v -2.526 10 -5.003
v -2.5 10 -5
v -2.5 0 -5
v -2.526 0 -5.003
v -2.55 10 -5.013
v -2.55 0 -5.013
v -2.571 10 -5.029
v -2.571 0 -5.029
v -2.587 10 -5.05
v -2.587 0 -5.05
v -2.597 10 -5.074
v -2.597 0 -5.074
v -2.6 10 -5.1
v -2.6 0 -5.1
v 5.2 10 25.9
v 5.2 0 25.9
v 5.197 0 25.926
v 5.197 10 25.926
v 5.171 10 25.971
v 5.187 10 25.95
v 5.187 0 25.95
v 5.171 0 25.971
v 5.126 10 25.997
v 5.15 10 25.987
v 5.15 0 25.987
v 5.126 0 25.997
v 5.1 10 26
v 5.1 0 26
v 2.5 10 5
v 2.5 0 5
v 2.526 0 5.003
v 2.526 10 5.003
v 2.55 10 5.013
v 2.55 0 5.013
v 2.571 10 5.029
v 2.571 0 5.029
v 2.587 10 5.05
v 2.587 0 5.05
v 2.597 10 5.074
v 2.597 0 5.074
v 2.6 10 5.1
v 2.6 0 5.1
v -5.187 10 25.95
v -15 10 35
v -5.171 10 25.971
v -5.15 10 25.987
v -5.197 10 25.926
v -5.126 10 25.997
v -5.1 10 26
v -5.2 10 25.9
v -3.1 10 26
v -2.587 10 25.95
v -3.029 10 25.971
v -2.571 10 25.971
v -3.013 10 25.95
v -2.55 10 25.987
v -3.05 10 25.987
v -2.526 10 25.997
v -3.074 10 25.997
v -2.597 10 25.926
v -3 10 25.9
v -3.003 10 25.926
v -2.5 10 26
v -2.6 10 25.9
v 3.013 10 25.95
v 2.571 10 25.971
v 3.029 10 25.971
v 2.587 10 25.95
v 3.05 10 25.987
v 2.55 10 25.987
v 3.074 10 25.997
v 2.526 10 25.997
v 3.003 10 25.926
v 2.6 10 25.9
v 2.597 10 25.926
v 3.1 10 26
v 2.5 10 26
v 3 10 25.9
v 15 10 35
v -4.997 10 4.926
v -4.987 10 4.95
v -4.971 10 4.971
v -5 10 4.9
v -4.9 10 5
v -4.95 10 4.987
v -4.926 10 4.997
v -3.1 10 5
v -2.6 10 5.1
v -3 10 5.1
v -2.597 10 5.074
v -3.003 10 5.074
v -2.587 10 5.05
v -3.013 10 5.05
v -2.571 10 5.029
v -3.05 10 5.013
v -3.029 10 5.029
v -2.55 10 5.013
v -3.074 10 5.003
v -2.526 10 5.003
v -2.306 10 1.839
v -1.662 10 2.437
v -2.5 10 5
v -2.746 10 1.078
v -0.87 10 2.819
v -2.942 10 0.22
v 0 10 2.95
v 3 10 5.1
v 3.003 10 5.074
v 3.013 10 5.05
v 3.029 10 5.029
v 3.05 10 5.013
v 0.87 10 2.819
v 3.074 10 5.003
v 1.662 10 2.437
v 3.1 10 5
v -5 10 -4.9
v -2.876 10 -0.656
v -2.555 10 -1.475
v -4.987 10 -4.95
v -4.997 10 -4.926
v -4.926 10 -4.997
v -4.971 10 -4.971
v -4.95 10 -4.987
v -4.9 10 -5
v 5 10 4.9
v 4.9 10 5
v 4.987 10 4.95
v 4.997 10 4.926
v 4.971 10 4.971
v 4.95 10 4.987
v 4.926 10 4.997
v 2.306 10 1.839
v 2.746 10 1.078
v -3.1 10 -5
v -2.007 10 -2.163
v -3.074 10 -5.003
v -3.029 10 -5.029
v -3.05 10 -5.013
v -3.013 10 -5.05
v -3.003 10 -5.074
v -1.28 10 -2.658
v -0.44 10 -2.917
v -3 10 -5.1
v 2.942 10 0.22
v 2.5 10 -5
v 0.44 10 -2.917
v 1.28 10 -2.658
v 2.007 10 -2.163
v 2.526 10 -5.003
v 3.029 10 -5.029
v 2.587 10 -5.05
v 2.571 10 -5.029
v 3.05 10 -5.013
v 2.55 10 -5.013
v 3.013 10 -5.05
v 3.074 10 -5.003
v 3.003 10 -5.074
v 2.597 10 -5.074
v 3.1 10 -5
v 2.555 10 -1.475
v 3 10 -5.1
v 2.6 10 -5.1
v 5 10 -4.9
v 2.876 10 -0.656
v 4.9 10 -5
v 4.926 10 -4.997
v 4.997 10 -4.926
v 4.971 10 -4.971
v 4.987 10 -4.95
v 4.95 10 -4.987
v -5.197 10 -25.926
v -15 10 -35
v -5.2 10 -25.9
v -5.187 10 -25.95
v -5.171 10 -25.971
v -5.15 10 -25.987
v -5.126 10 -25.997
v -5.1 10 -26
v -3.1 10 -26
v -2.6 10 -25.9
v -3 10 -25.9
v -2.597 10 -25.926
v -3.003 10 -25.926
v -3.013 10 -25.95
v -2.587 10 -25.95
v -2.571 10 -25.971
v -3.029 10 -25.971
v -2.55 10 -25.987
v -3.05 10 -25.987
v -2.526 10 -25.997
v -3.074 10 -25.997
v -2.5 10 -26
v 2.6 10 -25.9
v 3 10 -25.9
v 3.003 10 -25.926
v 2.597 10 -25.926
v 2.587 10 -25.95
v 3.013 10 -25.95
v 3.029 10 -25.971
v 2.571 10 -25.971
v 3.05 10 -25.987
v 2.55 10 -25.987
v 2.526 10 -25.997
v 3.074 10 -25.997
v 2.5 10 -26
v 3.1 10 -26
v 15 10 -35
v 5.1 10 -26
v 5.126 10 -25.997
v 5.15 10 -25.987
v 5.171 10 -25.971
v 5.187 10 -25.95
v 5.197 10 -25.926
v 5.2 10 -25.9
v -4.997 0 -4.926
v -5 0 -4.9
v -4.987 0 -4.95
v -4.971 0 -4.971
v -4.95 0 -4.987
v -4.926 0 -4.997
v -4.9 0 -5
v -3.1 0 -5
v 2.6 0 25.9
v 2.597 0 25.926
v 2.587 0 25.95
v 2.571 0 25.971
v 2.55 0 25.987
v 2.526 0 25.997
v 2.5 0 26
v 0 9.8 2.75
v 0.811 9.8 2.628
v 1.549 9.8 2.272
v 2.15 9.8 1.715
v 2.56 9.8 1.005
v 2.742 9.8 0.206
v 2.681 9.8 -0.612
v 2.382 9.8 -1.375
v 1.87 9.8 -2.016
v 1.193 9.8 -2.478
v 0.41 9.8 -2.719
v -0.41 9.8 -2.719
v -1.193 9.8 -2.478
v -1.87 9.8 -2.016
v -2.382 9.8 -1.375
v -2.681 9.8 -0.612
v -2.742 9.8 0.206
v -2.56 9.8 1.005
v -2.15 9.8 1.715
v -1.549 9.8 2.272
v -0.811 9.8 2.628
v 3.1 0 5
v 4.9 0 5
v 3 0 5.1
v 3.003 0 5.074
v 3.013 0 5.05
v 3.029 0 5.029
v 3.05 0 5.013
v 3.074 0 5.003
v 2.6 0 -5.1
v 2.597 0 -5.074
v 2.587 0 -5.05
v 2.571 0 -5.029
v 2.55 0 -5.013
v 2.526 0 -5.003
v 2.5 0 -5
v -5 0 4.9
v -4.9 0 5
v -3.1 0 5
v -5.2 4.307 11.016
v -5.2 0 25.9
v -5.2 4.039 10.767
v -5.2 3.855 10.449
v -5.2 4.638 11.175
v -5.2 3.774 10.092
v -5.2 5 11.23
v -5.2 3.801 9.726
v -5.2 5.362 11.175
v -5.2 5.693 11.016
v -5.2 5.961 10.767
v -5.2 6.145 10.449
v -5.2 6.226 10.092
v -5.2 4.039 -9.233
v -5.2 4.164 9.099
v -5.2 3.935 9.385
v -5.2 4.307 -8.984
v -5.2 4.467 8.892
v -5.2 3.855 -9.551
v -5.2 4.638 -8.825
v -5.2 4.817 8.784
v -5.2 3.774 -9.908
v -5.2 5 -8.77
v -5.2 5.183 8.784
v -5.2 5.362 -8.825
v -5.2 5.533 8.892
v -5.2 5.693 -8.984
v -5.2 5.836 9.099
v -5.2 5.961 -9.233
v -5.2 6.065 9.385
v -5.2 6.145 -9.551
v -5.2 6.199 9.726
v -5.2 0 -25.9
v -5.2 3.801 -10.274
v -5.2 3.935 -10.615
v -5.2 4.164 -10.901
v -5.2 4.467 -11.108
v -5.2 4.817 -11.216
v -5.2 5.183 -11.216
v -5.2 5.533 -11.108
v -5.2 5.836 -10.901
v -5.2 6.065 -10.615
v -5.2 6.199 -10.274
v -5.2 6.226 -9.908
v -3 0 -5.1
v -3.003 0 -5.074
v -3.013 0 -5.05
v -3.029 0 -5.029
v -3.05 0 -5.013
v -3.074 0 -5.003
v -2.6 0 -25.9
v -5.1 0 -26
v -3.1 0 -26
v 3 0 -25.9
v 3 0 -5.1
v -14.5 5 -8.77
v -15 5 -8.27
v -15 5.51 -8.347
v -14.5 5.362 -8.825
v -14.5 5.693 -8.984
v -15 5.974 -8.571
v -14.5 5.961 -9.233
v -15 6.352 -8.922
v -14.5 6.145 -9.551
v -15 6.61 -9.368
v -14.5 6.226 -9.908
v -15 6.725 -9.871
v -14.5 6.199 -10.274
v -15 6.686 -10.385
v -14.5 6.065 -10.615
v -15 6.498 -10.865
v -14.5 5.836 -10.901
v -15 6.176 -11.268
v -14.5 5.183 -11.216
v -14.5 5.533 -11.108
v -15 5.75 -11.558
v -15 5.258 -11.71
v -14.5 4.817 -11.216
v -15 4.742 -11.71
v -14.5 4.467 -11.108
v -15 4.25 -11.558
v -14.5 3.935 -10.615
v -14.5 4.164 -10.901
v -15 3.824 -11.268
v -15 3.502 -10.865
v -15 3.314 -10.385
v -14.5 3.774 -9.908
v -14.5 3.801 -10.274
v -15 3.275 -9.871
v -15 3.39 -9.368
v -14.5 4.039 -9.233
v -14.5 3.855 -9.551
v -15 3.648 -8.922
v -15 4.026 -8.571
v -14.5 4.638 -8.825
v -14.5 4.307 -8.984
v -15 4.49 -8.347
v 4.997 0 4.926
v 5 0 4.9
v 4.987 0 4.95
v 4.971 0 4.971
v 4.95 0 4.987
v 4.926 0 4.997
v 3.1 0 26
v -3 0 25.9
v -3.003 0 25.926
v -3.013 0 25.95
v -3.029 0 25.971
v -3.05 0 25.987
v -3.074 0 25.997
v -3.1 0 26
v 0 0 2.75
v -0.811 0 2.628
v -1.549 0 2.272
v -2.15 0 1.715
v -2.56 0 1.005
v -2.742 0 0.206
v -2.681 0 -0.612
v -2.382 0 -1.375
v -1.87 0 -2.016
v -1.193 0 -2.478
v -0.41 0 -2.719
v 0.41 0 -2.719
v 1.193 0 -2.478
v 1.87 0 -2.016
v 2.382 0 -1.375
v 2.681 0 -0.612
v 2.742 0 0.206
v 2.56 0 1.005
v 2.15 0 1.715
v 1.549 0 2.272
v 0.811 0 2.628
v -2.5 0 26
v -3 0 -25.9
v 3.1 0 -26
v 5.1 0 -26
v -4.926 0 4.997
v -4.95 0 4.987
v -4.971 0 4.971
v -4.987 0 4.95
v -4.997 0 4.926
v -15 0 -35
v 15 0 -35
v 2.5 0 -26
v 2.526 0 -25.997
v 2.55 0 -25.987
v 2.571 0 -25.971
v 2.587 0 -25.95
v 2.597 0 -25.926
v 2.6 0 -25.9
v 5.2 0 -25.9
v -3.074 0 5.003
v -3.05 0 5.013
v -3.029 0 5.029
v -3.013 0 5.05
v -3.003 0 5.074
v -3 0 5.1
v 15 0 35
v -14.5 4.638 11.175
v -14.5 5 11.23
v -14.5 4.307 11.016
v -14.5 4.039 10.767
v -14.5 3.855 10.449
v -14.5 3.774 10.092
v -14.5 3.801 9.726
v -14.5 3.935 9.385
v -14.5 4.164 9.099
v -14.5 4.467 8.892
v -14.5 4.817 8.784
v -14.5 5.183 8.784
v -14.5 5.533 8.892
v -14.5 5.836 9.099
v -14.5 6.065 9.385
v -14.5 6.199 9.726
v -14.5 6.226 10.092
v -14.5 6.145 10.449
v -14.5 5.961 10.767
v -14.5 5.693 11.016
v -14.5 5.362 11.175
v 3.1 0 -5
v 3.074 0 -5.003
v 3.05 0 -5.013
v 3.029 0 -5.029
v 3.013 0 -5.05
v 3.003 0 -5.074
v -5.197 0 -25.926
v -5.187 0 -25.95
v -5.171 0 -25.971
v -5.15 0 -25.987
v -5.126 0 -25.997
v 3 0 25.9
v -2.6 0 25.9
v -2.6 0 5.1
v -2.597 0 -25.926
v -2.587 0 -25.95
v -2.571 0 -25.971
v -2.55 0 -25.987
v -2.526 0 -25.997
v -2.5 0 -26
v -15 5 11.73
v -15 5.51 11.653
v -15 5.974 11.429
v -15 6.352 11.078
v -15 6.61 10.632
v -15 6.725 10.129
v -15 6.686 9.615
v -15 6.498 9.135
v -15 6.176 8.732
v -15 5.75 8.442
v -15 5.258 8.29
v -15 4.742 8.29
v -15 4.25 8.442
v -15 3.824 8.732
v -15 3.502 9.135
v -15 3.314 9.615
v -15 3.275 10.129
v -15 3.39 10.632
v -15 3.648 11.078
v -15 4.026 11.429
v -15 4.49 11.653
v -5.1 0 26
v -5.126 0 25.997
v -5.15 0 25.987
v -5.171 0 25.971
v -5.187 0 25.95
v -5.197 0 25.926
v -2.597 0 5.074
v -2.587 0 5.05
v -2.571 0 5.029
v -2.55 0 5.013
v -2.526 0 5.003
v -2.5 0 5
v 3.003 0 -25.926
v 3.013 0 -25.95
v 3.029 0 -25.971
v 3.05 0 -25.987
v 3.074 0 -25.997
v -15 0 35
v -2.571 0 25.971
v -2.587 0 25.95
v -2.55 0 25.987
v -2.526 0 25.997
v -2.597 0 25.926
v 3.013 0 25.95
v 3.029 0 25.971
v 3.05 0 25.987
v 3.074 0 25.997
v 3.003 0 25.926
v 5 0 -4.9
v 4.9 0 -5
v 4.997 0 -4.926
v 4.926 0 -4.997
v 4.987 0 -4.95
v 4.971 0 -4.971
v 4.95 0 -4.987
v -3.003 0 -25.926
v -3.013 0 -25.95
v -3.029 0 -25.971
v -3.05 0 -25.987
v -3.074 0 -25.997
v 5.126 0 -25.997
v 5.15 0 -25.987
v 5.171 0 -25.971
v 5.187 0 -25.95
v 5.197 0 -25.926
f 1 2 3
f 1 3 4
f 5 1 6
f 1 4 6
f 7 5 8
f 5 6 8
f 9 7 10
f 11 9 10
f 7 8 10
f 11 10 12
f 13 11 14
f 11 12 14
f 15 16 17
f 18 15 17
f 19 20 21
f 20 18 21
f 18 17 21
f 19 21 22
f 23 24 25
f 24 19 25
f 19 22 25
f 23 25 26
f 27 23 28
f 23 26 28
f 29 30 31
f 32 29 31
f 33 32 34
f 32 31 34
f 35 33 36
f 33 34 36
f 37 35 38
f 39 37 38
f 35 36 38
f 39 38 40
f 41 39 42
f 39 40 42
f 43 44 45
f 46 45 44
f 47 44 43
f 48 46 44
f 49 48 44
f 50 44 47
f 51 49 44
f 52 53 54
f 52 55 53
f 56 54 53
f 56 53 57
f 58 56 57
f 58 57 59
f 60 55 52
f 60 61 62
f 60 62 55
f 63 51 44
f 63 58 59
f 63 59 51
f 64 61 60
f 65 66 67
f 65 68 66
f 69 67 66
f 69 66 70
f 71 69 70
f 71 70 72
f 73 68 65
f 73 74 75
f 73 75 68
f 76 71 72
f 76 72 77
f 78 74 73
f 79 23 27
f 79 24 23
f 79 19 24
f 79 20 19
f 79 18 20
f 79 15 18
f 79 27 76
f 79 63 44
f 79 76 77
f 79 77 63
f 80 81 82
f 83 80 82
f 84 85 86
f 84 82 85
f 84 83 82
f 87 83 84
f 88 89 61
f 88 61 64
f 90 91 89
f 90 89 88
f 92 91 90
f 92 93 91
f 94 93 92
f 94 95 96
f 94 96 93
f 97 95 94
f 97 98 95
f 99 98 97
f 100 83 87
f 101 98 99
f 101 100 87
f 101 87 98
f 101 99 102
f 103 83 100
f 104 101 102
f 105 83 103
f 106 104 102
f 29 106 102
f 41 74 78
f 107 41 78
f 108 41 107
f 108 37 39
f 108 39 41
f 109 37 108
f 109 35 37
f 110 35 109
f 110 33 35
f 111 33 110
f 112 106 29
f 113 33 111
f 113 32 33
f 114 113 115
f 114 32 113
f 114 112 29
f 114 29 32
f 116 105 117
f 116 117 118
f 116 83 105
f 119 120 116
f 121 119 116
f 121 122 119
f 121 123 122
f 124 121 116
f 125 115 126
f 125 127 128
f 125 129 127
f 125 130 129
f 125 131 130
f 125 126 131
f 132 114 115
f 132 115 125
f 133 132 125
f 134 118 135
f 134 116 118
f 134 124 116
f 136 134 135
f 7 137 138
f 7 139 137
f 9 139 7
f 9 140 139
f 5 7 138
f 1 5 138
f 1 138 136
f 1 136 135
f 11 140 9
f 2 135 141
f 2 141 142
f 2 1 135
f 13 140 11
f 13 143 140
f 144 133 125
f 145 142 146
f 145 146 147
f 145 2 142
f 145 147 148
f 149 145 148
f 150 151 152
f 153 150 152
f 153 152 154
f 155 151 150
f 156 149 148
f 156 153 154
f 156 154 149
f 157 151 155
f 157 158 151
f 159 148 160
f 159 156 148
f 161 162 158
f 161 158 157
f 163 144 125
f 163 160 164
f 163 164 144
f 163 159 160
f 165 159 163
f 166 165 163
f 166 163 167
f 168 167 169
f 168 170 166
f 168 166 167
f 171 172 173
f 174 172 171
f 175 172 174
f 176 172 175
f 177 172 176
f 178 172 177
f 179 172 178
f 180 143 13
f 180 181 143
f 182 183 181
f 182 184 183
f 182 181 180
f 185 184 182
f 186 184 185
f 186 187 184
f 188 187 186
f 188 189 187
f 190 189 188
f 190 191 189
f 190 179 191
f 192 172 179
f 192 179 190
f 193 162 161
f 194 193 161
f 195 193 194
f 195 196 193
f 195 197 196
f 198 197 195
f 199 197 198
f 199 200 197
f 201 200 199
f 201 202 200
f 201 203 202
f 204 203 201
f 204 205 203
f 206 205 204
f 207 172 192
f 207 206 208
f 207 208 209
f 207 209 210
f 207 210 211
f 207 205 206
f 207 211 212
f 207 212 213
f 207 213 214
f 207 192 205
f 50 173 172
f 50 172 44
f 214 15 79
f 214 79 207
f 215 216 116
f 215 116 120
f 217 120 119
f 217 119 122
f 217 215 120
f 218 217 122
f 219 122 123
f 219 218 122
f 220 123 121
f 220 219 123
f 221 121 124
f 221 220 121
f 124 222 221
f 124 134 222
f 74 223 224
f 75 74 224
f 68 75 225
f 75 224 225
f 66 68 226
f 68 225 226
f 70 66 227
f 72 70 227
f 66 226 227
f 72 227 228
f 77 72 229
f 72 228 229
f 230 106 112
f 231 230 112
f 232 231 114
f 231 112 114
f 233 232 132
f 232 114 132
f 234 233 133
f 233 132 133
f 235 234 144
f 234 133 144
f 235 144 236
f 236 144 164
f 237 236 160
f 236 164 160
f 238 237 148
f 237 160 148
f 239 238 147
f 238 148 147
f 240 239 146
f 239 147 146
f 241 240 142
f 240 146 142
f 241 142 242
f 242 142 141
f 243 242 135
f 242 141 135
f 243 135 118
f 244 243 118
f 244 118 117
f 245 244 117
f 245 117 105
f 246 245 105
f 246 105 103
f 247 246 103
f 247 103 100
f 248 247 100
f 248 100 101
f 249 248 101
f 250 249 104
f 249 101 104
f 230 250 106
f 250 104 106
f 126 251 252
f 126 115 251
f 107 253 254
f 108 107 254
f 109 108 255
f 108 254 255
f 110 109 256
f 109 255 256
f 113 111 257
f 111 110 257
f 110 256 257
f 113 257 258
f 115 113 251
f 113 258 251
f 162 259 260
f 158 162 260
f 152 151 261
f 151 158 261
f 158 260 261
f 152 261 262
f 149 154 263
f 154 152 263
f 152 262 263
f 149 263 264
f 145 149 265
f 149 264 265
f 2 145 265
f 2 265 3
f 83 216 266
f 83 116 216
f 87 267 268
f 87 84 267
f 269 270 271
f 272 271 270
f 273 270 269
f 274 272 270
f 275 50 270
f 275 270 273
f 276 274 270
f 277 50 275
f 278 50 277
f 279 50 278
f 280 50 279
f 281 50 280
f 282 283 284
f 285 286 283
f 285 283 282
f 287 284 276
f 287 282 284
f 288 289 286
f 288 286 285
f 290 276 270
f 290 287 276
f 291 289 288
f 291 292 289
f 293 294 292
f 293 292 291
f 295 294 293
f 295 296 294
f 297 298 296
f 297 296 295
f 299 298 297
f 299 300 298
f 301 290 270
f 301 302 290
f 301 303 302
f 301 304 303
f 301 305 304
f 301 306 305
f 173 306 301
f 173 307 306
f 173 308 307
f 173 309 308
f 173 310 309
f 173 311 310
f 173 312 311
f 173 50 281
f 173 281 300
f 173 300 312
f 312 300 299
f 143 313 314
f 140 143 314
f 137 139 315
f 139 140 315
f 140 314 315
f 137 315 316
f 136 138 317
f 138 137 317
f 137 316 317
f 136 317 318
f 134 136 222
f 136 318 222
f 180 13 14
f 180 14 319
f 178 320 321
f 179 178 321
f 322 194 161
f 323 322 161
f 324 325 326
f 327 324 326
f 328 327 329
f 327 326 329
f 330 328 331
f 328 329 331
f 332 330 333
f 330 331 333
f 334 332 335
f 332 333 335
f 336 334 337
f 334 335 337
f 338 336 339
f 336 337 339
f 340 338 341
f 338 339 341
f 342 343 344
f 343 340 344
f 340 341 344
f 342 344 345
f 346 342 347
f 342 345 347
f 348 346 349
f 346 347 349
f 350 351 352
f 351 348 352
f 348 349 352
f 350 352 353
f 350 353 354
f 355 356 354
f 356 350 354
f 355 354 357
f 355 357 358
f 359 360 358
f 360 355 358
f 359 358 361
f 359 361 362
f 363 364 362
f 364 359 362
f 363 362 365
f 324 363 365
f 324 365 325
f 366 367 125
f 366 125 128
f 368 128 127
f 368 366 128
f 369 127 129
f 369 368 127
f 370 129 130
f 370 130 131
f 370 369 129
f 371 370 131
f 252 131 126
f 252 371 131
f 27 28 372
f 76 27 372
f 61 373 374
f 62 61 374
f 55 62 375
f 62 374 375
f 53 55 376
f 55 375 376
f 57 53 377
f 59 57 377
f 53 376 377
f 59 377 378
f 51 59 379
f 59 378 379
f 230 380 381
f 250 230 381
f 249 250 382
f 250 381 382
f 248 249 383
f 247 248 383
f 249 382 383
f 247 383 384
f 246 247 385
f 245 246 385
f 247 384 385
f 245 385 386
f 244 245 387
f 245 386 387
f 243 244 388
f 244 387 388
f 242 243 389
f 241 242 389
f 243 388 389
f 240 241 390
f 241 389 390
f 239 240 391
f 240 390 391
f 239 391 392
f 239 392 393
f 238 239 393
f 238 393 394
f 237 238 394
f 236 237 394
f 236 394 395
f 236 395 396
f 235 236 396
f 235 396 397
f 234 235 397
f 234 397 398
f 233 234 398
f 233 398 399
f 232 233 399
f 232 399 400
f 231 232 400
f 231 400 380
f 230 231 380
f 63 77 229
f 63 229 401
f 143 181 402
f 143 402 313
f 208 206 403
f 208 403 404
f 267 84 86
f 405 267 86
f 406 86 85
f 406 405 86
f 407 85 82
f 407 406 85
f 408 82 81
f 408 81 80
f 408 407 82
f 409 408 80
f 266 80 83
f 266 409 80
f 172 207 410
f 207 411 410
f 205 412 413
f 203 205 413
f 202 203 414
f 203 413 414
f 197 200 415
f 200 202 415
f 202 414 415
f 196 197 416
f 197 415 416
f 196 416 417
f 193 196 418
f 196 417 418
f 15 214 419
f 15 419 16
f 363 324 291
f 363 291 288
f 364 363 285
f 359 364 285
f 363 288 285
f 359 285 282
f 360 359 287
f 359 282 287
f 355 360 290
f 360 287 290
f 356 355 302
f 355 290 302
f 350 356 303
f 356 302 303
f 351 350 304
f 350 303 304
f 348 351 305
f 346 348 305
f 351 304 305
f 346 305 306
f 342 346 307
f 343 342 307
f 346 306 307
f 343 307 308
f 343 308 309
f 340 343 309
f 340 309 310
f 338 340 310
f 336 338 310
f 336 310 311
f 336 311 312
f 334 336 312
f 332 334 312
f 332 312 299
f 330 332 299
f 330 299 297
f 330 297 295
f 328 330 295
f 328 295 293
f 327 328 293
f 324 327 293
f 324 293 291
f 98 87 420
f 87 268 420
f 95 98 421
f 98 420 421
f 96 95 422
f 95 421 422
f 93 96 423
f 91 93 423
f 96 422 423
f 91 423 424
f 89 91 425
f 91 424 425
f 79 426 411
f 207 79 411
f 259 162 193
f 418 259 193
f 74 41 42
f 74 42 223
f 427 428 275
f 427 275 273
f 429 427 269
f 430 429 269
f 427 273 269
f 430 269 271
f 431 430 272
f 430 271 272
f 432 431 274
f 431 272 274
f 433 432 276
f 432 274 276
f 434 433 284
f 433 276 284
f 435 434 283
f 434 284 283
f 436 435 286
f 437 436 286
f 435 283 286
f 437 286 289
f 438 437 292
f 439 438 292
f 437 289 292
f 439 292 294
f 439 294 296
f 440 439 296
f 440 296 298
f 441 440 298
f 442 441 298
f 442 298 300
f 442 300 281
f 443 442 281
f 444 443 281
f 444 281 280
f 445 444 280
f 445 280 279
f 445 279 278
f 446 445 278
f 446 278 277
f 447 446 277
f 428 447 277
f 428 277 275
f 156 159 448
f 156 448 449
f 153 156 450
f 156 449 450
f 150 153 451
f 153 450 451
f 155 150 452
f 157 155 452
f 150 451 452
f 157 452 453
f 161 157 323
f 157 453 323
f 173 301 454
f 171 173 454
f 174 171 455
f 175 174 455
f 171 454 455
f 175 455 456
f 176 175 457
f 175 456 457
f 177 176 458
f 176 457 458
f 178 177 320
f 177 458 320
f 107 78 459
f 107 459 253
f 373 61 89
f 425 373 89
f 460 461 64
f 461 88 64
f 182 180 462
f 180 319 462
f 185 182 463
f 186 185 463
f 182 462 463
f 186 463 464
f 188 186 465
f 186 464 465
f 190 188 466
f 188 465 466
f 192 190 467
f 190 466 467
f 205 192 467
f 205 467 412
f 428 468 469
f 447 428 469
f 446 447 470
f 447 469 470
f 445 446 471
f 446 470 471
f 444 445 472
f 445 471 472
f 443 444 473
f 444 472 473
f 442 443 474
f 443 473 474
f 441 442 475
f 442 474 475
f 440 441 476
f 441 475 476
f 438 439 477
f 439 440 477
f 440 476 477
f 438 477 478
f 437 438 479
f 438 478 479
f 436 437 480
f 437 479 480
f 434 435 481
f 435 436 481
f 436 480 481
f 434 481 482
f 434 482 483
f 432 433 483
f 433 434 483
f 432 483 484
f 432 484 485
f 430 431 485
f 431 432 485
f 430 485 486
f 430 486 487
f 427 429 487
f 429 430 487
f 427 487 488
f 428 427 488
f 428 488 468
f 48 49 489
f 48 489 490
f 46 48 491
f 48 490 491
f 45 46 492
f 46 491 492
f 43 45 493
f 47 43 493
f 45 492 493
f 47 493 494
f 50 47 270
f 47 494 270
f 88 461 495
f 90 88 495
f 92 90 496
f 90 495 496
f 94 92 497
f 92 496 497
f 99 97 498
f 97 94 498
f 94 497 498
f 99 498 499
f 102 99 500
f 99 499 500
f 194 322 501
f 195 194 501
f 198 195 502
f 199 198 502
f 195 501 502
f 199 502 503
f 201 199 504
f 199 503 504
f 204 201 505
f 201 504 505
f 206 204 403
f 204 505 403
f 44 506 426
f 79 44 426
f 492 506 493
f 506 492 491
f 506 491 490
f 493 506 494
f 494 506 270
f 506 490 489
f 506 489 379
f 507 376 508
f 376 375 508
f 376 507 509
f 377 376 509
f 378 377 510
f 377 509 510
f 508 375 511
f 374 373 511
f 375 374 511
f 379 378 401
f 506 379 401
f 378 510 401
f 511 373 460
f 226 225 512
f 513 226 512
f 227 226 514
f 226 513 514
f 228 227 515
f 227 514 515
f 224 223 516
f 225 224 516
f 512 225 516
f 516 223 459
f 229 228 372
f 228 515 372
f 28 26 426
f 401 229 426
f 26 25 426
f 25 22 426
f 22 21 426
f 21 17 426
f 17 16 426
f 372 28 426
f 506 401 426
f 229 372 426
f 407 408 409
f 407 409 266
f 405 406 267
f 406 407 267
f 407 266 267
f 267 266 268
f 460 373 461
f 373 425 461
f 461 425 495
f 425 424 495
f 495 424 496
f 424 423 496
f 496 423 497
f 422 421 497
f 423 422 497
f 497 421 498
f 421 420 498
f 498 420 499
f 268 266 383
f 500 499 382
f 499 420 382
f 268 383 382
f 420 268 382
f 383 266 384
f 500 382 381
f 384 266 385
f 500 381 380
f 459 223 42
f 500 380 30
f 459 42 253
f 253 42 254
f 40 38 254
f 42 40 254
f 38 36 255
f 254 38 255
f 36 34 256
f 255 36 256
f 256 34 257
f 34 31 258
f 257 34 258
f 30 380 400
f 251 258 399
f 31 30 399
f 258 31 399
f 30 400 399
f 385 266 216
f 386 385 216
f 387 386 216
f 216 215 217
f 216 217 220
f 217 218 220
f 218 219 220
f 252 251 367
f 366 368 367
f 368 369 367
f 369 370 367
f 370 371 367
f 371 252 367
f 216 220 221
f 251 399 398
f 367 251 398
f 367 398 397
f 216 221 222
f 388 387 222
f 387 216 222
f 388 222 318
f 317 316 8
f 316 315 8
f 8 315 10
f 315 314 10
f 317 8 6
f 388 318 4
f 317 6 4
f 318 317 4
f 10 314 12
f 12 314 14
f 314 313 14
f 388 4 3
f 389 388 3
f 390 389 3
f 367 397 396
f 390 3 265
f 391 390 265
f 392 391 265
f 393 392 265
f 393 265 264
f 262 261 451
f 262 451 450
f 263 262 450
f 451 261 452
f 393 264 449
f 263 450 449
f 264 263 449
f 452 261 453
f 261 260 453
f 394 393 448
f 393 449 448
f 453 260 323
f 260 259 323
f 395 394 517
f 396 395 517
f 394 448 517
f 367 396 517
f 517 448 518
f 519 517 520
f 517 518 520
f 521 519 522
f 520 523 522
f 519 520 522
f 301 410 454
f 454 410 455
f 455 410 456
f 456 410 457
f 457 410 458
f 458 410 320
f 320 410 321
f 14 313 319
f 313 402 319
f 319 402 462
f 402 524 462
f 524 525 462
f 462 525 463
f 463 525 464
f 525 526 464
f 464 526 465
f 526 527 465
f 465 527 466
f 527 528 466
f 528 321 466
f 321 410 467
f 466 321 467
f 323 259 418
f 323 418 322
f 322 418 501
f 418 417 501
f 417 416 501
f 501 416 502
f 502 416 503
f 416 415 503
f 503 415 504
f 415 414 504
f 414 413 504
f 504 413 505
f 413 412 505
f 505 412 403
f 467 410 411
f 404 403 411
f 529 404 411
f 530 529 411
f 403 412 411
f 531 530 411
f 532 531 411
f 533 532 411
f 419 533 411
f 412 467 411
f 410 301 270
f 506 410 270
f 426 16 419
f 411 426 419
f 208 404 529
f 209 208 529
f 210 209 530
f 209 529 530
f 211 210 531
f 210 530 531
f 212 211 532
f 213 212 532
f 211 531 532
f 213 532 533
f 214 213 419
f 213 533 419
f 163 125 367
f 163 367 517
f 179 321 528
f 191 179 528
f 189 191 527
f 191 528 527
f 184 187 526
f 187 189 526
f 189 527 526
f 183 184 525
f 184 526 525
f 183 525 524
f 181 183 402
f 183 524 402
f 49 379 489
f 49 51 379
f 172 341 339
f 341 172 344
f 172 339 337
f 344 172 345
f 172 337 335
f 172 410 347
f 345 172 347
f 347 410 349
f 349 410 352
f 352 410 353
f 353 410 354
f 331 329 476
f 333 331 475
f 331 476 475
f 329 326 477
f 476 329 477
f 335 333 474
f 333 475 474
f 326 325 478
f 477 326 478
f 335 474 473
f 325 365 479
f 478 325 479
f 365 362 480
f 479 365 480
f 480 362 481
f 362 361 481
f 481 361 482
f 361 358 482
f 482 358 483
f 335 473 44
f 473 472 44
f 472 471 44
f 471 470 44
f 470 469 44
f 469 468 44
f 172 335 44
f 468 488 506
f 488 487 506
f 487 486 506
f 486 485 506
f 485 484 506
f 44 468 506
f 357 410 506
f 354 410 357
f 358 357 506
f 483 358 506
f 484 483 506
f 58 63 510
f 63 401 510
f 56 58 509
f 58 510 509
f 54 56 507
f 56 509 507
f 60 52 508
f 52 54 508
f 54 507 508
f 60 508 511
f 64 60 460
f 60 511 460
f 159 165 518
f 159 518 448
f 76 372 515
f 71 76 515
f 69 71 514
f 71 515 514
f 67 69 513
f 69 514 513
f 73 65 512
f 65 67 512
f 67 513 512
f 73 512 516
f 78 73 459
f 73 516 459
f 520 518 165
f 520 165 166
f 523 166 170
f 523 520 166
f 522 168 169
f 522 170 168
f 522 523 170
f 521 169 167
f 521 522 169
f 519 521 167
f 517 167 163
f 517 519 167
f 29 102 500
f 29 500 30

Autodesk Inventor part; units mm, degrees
ref_plane "YZ Plane" through (0, 0, 0) normal (1, 0, 0) x (0, 1, 0)
ref_plane "XZ Plane" through (0, 0, 0) normal (0, 1, 0) x (-1, 0, 0)
ref_plane "XY Plane" through (0, 0, 0) normal (0, 0, 1) x (1, 0, 0)
sketch "Sketch1" plane through (0, 0, 0) normal (0, 1, 0) x (-1, 0, 0)
  line L0 (15, 35) -> (-15, 35)
  line L1 (-15, 35) -> (-15, -35)
  line L2 (-15, -35) -> (15, -35)
  line L3 (15, -35) -> (15, 35)
  line L4 (15, 35) -> (-15, -35) construction
  line L5 (-15, 35) -> (15, -35) construction
  point P0 (0, 0)
  dimension "d0" = 30
  dimension "d1" = 70
extrude "gabaryty" add sketch "Sketch1" along normal blind 10
sketch "Sketch2" plane through (0, 10, 0) normal (0, 1, 0) x (1, 0, 0)
  line L0 (5.2, -26) -> (-5.2, -26)
  line L1 (-5.2, -26) -> (-5.2, 26)
  line L2 (-5.2, 26) -> (5.2, 26)
  line L3 (5.2, 26) -> (5.2, -26)
  line L4 (5.2, -26) -> (-5.2, 26) construction
  line L5 (-5.2, -26) -> (5.2, 26) construction
  point P0 (0, 0)
  dimension "d4" = 10.4
  dimension "d5" = 52
extrude "przestrzen srodek" cut sketch "Sketch2" against normal through all
sketch "Sketch3" plane through (0, 10, 0) normal (0, 1, 0) x (1, 0, 0)
  line L0 (5, 5) -> (-5, 5)
  line L1 (-5, 5) -> (-5, -5)
  line L2 (-5, -5) -> (5, -5)
  line L3 (5, -5) -> (5, 5)
  line L4 (5, 5) -> (-5, -5) construction
  line L5 (-5, 5) -> (5, -5) construction
  point P0 (0, 0)
  dimension "d8" = 10
  dimension "d9" = 10
extrude "bloczek srodek" add sketch "Sketch3" against normal blind 10
sketch "Sketch4" plane through (0, 10, 0) normal (0, 1, 0) x (1, 0, 0)
  line L0 (-5, 5) -> (-5, -5) construction
  line L1 (-5, -5) -> (5, -5) construction
  line L2 (5, -5) -> (5, 5) construction
  line L3 (5, 5) -> (-5, 5) construction
  line L4 (-5.2, -26) -> (-5.2, 26) construction
  line L5 (-5.2, 26) -> (5.2, 26) construction
  line L6 (5.2, 26) -> (5.2, -26) construction
  line L7 (5.2, -26) -> (-5.2, -26) construction
  line L8 (15, -35) -> (15, 35) construction
  line L9 (15, 35) -> (-15, 35) construction
  line L10 (-15, 35) -> (-15, -35) construction
  line L11 (-15, -35) -> (15, -35) construction
  line L12 (-5.2, -26) -> (5.2, -26) projected
  line L13 (-3, -5) -> (-2.6, -5)
  line L14 (-2.6, -5) -> (-2.6, -26)
  line L15 (-2.6, -26) -> (-3, -26)
  line L16 (-3, -26) -> (-3, -5)
  line L17 (3, -5) -> (2.6, -5)
  line L18 (2.6, -5) -> (2.6, -26)
  line L19 (2.6, -26) -> (3, -26)
  line L20 (3, -26) -> (3, -5)
  line L21 (3, 5) -> (2.6, 5)
  line L22 (2.6, 5) -> (2.6, 26)
  line L23 (2.6, 26) -> (3, 26)
  line L24 (3, 26) -> (3, 5)
  line L25 (-5, 5) -> (5, 5) projected
  line L26 (-3, 5) -> (-2.6, 5)
  line L27 (-2.6, 5) -> (-2.6, 26)
  line L28 (-2.6, 26) -> (-3, 26)
  line L29 (-3, 26) -> (-3, 5)
  point P0 (0, 0)
  point P1 (-2.6, 5)
  dimension "d12" = 0.4
  dimension "d13" = 2
  dimension "d14" = 0.4
  dimension "d15" = 2
  dimension "d16" = 0.4
  dimension "d17" = 2
  dimension "d18" = 0.4
  dimension "d19" = 2
extrude "Belki" add sketch "Sketch4" against normal blind 10
sketch "Sketch5" plane through (0, 10, 0) normal (0, 1, 0) x (1, 0, 0)
  point P0 (0, 0)
  point P1 (0, 0)
hole "srodek" at (0, 10, 0) direction (0, -1, 0) diameter 5.5 end through all clearance for "Slotted Cheese Head Screw ISO 1207" size "M5" standard "ISO"
sketch "Sketch6" plane through (-15, 0, -35) normal (-1, 0, 0) x (0, 0, 1)
  line L0 (0, 0) -> (70, 0) construction
  line L1 (70, 0) -> (70, 10) construction
  line L2 (0, 10) -> (70, 10) construction
  line L3 (0, 0) -> (0, 10) construction
  line L4 (35, 0) -> (35, 10) construction
  point P0 (45, 5)
  point P1 (25, 5)
  dimension "d29" = 10
  dimension "d30" = 10
  dimension "d31" = 5
  dimension "d32" = 5
hole "mocowanie gora" at (-15, 5, 10) at (-15, 5, -10) direction (1, 0, 0) diameter 2.459 depth 9.8 thread size "M3x0.5" class "6H" standard "ISO Metric profile"
chamfer "Chamfer1" distance 0.5 angle 45 2 edges at (-15, 5, -11.2295) (-15, 5, 8.7705)
fillet "zaokraglenie lasera" radius 0.1 24 edges at (-3, 5, 5) (-2.6, 5, 5) (-3, 5, 26) (-2.6, 5, 26) (2.6, 5, 26) (2.6, 5, 5) (3, 5, 5) (3, 5, 26) (3, 5, -5) (2.6, 5, -5) (-2.6, 5, -5) (-3, 5, -5) (-3, 5, -26) (2.6, 5, -26) (-2.6, 5, -26) (3, 5, -26) (-5.2, 5, 26) (-5.2, 5, -26) (5.2, 5, -26) (5.2, 5, 26) (-5, 5, 5) (-5, 5, -5) (5, 5, -5) (5, 5, 5)
chamfer "Chamfer2" distance 0.2 angle 45 1 edges at (0, 10, -2.75)
equation "\"d14\" = d12"
equation "\"d15\" = d13"
equation "\"d16\" = d12"
equation "\"d17\" = d13"
equation "\"d18\" = d12"
equation "\"d19\" = d13"
equation "\"d30\" = d29"
equation "\"d32\" = d31"
properties material "Steel ASTM A36"
